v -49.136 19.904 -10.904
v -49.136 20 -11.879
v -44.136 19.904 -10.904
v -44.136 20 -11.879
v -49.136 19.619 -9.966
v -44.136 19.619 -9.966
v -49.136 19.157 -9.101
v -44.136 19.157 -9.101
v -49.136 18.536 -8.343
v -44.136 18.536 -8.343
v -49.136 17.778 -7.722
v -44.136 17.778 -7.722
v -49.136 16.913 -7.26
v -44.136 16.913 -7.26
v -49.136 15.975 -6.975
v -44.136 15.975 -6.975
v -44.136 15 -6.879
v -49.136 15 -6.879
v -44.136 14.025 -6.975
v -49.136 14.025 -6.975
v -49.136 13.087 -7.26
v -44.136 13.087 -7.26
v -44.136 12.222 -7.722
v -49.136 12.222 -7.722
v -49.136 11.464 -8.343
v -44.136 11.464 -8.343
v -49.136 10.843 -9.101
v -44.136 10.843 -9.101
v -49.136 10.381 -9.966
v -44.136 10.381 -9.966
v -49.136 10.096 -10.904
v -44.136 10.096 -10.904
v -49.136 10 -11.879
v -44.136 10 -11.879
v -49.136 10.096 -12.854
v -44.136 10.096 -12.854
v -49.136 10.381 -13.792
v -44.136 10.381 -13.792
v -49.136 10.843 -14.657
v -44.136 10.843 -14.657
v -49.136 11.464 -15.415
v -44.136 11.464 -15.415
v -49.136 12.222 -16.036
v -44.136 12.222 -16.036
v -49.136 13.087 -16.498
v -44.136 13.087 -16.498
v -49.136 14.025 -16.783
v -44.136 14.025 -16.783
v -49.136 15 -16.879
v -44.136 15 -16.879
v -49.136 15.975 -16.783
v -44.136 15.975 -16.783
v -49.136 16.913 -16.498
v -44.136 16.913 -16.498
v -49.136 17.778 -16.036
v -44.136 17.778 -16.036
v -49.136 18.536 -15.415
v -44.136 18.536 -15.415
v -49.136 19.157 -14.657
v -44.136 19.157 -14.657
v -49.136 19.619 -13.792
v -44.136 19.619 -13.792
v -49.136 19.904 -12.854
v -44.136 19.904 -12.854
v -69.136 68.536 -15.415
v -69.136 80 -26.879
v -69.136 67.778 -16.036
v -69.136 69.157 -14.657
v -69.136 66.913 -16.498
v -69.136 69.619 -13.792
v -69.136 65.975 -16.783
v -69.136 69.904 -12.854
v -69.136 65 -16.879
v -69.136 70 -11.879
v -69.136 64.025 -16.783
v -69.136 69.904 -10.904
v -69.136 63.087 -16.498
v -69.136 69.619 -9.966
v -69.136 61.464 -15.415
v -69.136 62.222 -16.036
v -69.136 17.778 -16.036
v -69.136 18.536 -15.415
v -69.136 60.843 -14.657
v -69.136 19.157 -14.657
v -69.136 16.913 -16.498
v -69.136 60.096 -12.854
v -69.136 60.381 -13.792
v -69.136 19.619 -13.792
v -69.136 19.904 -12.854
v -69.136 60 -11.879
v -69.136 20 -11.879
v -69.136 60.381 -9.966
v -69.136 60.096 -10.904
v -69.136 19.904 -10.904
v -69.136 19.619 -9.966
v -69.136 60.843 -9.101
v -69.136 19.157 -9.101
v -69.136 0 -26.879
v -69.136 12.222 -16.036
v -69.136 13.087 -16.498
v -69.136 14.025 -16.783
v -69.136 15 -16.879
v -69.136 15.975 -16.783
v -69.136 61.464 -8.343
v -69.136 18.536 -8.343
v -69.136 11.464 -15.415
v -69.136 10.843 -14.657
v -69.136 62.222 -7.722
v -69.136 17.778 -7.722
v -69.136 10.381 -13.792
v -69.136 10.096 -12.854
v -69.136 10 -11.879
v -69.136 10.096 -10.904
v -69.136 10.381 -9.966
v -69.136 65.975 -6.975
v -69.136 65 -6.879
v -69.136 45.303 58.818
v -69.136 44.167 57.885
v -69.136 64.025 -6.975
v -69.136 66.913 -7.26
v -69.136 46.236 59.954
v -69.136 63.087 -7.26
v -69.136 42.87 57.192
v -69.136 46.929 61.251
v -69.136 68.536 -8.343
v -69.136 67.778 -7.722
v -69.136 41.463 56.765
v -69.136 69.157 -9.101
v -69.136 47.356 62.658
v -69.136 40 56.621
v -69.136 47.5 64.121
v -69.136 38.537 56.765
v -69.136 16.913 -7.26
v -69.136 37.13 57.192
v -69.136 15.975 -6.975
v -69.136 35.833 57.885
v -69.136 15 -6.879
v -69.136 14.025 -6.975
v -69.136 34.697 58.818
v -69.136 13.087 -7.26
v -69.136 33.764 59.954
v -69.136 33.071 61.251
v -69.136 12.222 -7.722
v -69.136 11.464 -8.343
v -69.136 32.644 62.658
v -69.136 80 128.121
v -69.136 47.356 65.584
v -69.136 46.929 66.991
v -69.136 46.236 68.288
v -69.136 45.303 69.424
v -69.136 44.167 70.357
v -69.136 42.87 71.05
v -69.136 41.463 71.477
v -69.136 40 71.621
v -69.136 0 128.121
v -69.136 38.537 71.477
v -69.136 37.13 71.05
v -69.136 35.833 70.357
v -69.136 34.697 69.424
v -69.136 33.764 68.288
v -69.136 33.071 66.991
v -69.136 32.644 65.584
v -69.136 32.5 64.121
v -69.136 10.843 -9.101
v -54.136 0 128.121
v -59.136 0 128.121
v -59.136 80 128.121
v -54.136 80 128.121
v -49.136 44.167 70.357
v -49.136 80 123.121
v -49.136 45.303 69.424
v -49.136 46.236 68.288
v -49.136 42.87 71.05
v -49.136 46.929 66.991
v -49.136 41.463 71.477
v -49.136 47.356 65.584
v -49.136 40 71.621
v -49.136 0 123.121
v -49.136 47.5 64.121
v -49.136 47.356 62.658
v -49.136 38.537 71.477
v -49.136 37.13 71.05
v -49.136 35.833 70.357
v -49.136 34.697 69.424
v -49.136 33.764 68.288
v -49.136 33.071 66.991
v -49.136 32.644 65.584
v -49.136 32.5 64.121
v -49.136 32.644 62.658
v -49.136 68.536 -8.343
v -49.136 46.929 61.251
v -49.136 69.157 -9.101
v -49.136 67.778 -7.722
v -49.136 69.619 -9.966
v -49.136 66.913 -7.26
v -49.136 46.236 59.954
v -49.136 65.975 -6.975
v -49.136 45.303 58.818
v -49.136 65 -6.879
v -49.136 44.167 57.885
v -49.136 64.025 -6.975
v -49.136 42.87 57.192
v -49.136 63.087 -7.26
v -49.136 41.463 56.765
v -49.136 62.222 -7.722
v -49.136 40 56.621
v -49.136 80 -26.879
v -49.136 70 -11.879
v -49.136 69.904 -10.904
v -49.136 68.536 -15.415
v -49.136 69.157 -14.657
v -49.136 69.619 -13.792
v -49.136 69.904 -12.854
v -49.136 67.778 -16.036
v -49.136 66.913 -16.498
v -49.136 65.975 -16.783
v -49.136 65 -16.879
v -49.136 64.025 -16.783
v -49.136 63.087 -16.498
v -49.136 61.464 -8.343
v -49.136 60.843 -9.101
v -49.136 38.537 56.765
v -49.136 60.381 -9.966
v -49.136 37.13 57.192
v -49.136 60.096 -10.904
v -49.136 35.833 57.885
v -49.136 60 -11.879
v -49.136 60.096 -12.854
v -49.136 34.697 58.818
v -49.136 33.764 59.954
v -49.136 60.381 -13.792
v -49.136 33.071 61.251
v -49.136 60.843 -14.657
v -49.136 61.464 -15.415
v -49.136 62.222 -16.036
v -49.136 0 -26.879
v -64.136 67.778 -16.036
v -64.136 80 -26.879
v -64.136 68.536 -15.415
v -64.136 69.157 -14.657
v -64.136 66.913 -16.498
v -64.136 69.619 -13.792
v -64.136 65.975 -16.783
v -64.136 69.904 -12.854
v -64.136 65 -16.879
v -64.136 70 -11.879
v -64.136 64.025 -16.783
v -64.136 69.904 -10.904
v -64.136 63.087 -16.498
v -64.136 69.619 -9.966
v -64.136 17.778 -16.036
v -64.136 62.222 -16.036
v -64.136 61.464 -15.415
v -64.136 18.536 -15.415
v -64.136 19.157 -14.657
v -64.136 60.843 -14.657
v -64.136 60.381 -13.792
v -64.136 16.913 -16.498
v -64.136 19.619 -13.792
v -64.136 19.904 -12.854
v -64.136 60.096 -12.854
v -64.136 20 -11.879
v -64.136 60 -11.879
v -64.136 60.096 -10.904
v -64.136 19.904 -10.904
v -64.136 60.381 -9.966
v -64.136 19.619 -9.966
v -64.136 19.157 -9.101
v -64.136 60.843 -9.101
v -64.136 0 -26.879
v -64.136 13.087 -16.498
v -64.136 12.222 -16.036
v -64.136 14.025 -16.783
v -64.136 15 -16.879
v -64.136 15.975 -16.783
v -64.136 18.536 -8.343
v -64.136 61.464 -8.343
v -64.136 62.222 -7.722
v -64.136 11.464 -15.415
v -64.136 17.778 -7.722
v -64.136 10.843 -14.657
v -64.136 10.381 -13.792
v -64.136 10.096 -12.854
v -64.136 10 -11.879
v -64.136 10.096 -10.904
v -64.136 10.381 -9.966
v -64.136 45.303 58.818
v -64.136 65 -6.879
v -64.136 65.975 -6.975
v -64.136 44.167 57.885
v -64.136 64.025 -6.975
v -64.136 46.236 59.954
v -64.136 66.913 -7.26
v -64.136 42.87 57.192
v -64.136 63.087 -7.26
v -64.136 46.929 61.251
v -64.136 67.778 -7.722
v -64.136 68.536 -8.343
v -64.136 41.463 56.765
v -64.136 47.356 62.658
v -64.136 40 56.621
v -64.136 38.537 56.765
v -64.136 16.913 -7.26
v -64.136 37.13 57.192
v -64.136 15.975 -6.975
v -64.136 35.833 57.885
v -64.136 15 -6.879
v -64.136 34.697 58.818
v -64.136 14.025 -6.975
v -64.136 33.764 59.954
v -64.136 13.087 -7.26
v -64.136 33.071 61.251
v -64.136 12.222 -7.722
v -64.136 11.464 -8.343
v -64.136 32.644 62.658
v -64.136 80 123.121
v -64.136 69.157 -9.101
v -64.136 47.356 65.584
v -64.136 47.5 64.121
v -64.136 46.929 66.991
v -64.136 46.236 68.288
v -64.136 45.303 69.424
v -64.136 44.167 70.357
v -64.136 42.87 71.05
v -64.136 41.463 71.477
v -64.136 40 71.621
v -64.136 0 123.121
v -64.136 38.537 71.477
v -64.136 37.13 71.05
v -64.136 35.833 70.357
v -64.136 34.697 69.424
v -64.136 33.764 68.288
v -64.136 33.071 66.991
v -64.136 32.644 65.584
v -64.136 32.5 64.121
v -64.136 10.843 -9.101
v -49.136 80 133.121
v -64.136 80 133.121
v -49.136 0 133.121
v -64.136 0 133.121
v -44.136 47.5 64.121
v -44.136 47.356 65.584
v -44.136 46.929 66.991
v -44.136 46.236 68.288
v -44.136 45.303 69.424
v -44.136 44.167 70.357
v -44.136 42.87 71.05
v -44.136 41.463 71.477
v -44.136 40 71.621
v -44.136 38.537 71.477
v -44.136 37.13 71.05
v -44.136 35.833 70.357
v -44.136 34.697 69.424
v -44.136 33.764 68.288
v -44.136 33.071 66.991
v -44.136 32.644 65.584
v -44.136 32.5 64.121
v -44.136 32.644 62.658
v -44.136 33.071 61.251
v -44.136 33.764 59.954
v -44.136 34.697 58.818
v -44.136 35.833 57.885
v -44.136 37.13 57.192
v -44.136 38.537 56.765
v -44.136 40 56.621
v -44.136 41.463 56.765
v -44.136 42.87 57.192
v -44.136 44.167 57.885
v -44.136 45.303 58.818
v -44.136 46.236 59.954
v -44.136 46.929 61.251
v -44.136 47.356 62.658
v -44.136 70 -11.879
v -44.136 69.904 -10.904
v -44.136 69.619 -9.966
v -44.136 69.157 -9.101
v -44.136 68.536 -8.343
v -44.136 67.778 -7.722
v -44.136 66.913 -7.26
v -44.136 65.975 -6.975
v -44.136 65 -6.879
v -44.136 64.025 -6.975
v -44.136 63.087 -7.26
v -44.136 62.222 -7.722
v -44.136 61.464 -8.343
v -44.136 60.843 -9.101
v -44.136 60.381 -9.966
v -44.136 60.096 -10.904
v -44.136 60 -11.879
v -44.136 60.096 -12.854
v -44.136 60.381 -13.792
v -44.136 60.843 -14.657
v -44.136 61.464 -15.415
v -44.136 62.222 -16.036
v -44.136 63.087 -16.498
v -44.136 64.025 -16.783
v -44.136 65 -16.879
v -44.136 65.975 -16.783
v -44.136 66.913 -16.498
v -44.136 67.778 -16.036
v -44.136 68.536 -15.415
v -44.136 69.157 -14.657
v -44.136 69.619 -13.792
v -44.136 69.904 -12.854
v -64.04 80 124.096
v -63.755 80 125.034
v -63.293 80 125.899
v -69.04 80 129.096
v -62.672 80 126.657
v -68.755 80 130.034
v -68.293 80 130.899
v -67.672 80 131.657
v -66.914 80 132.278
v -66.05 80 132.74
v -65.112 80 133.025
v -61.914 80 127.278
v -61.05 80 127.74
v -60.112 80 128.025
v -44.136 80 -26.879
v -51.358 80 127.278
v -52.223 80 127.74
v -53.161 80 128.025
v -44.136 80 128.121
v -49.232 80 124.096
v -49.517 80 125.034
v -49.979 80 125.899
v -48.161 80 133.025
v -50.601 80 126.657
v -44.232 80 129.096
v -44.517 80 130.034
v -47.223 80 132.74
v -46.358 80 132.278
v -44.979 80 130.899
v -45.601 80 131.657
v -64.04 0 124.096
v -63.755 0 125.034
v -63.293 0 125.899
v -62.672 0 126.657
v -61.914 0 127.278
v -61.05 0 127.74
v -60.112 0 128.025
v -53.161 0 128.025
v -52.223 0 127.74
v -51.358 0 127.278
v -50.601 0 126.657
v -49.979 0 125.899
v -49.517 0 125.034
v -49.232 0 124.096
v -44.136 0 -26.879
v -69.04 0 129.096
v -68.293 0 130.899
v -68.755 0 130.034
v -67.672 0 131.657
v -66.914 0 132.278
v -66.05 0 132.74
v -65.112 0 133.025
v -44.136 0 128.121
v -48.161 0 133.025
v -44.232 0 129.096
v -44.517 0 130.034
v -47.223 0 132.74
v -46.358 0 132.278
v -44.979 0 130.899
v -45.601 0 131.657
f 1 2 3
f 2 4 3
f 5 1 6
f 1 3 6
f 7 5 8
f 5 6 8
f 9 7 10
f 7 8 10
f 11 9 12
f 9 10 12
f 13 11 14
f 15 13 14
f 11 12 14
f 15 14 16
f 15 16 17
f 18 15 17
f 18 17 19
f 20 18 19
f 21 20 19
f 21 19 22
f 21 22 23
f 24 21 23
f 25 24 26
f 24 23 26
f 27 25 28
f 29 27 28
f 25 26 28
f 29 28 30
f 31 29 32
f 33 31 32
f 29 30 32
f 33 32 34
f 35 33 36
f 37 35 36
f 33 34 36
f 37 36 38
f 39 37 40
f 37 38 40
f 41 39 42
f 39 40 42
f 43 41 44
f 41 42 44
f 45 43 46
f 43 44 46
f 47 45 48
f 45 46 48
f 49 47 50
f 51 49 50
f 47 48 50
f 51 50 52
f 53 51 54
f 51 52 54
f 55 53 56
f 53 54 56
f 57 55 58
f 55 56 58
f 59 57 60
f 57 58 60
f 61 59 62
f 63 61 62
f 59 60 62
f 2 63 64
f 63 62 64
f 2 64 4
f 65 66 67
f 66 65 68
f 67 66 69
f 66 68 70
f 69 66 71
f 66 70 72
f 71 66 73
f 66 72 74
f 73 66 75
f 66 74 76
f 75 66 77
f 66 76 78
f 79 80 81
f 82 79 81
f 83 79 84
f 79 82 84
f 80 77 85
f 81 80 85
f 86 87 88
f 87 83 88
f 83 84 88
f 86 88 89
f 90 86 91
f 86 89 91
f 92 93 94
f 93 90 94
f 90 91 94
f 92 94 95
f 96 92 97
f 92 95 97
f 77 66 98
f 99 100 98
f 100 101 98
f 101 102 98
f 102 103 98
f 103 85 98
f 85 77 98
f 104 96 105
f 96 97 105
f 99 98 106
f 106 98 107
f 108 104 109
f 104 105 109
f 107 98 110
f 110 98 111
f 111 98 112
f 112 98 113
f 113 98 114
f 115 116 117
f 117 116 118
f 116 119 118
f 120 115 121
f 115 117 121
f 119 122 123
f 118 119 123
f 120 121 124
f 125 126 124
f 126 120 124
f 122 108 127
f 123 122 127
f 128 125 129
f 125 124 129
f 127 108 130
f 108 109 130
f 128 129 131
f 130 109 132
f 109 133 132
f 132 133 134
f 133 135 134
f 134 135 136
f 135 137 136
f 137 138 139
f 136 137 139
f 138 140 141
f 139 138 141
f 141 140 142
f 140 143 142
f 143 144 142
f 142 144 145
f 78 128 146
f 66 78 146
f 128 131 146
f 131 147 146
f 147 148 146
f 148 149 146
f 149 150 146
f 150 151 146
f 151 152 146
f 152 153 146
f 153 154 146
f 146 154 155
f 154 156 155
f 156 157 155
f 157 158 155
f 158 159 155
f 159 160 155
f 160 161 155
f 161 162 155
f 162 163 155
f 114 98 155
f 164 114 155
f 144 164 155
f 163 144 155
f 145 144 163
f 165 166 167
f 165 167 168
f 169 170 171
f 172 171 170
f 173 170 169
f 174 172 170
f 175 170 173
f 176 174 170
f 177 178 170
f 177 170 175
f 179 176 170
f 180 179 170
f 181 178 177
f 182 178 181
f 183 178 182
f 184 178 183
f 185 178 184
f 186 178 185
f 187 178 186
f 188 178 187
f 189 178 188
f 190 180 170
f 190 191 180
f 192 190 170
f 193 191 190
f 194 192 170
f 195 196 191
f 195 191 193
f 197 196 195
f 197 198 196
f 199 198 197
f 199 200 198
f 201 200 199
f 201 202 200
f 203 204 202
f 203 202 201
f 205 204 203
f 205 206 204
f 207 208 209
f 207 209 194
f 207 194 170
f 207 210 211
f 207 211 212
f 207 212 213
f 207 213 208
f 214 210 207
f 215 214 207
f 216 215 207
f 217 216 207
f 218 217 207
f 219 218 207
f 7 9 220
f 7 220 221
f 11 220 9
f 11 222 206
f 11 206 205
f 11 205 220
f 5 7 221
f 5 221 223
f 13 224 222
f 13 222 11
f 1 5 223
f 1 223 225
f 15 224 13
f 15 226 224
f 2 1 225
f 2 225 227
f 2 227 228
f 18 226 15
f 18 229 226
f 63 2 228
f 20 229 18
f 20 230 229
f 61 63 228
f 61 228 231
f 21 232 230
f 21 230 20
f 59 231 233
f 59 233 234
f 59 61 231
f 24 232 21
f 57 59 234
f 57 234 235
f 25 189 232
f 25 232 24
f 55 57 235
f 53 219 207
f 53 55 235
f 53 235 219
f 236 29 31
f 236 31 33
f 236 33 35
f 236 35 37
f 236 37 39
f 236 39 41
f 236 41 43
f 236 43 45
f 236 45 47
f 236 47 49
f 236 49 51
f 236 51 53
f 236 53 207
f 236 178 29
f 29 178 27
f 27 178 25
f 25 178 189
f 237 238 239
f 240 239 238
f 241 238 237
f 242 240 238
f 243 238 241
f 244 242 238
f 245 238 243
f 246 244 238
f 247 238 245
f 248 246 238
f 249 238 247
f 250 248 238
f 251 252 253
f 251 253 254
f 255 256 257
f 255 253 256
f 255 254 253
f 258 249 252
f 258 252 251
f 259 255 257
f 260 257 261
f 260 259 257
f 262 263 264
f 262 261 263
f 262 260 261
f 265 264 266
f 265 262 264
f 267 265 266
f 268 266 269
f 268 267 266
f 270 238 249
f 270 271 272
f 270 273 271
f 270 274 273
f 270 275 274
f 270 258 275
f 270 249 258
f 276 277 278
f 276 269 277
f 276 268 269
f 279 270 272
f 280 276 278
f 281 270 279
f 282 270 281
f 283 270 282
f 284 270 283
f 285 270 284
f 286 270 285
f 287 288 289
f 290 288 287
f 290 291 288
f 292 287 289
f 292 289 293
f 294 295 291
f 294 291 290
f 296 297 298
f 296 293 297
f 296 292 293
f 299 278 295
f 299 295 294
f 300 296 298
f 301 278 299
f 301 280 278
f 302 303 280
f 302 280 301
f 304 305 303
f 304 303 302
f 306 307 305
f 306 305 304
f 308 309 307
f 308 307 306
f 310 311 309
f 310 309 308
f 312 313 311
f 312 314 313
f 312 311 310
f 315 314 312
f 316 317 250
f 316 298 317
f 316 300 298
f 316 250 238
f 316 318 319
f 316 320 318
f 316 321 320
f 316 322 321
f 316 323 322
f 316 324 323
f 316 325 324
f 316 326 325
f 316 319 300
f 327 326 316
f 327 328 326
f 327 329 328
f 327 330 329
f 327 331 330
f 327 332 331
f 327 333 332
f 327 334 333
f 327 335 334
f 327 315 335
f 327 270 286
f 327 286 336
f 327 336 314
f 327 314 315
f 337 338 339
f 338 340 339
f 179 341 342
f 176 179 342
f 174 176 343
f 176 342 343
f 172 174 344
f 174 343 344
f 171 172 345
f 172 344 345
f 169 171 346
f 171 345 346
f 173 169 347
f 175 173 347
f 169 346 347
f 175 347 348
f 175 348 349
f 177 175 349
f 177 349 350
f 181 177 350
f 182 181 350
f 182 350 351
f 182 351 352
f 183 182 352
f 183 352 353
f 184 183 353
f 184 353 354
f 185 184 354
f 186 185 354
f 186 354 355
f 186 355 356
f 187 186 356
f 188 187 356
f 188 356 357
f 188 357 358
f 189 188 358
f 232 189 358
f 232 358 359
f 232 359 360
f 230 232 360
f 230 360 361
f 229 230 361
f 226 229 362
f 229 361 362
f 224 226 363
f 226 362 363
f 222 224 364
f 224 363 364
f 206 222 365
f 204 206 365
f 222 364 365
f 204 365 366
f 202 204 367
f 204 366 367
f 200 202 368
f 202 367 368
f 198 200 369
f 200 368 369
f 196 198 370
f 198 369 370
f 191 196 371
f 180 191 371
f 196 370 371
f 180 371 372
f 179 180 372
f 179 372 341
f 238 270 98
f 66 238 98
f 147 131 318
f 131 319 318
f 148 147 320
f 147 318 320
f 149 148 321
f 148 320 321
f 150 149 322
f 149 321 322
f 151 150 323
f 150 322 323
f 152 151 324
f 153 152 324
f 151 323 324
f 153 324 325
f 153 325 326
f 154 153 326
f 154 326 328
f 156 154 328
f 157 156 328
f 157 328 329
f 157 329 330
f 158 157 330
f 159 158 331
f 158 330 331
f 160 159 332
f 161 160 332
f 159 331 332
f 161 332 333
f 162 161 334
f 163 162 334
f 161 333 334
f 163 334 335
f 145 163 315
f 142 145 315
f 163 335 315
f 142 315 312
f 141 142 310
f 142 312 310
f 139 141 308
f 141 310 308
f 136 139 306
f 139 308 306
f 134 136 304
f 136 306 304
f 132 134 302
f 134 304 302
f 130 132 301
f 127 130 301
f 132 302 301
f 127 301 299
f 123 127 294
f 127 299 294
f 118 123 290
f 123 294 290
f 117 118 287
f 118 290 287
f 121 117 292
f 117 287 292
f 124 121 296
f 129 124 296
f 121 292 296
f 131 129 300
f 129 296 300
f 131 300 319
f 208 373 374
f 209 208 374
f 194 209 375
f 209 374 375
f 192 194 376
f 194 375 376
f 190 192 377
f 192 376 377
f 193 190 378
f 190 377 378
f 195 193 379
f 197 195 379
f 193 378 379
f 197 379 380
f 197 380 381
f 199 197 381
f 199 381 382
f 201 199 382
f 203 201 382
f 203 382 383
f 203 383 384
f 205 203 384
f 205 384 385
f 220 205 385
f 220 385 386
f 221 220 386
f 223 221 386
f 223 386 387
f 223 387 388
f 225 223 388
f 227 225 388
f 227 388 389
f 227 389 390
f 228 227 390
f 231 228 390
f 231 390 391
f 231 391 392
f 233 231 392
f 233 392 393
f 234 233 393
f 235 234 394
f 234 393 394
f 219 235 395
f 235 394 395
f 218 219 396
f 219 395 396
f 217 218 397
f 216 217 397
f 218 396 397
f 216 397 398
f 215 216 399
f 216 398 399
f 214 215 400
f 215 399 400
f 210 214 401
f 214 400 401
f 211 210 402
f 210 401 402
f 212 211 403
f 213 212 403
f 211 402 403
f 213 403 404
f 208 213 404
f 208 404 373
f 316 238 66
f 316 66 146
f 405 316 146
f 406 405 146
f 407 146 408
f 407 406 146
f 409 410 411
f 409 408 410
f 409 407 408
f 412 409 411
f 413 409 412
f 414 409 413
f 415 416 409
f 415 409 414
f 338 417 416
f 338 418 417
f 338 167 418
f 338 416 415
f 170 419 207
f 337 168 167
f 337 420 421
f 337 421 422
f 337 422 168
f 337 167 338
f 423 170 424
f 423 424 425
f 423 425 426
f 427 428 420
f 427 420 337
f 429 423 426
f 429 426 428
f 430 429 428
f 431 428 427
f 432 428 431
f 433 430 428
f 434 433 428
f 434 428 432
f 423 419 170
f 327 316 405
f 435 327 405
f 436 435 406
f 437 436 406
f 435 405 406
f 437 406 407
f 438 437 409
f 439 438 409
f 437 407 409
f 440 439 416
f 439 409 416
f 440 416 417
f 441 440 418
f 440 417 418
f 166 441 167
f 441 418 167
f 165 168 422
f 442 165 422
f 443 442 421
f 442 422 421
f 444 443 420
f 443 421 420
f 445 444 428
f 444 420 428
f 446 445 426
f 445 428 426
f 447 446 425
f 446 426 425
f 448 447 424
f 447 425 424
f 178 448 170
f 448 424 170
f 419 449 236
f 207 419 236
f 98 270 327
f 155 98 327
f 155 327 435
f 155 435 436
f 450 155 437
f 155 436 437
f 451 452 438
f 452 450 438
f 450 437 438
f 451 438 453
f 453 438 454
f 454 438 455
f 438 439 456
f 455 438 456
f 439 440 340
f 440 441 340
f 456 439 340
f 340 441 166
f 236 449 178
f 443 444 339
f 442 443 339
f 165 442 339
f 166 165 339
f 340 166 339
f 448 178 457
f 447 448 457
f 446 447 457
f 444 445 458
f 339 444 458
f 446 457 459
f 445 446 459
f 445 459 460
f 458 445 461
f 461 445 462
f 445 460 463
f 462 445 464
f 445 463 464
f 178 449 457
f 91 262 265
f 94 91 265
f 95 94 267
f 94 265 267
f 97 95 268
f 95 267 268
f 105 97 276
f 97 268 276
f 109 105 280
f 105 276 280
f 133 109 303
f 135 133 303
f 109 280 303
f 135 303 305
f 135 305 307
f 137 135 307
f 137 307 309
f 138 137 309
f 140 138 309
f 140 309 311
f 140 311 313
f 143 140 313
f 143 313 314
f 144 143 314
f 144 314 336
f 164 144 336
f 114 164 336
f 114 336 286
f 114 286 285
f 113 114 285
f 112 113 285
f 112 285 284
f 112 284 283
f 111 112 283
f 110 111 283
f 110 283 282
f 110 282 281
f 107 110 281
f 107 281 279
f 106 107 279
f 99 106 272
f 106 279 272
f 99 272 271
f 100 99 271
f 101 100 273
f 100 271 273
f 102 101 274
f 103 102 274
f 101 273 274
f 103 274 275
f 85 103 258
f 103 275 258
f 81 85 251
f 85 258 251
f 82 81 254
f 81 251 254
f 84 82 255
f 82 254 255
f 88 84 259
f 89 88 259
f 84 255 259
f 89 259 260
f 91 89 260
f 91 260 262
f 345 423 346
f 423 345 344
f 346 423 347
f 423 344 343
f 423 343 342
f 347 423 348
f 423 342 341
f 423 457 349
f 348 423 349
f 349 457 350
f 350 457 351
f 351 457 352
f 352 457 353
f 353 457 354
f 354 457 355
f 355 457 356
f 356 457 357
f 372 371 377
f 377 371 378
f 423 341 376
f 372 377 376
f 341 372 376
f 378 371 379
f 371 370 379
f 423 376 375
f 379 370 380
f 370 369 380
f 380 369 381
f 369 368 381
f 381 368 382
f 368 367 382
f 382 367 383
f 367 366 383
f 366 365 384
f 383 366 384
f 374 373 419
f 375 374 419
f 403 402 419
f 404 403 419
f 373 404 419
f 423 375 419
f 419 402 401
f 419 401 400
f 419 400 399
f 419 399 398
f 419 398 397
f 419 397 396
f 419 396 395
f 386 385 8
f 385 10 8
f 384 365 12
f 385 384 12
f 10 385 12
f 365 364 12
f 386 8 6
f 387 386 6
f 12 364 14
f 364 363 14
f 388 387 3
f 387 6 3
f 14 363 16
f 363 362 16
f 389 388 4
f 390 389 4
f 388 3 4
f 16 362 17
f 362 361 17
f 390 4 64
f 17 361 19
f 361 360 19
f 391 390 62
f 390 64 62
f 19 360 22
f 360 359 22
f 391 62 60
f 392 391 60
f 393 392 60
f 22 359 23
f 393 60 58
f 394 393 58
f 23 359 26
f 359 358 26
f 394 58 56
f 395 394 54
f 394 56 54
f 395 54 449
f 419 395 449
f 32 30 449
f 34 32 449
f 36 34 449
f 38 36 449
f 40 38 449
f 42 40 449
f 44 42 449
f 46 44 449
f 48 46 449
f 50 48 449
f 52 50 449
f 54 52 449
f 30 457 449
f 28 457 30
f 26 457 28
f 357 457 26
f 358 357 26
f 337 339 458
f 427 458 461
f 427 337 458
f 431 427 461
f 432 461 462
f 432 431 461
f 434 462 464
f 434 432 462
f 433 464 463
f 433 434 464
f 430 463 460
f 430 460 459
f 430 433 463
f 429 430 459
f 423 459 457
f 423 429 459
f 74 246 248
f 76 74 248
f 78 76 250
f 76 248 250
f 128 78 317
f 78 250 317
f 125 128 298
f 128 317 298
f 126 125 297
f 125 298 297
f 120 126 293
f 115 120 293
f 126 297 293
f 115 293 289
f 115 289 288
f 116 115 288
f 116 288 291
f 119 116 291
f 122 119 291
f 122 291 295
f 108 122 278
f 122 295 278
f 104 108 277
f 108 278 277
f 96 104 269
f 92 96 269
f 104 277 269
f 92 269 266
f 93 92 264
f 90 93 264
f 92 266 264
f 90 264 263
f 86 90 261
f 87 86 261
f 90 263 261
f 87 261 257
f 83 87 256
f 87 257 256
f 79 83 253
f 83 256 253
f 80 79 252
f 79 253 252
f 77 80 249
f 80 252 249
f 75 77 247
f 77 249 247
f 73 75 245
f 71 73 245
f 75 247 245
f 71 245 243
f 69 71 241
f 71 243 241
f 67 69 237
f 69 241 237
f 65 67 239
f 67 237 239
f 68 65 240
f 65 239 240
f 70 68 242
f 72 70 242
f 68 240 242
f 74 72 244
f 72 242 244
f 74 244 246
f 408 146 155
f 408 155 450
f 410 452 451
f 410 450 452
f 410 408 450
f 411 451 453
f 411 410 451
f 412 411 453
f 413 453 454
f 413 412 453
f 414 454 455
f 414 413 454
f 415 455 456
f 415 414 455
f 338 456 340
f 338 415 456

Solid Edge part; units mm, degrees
sketch "Sketch1" plane through (0, 0, 0) normal (0, -1, 0) x (1, 0, 0)
  line L0 (-69.1361, 133.121) -> (-44.1361, 133.121)
  line L1 (-44.1361, 133.121) -> (-44.1361, -26.879)
  line L2 (-44.1361, -26.879) -> (-49.1361, -26.879)
  line L3 (-49.1361, 128.121) -> (-49.1361, -26.879)
  line L4 (-64.1361, 128.121) -> (-49.1361, 128.121)
  line L5 (-64.1361, -26.879) -> (-64.1361, 128.121)
  line L6 (-64.1361, -26.879) -> (-69.1361, -26.879)
  line L7 (-69.1361, -26.879) -> (-69.1361, 133.121)
extrude "Protrusion1" add sketch "Sketch1" against normal blind 80
fillet "Round_1" radius 5 2 edges at (-69.1361, 40, 133.121) (-44.1361, 40, 133.121)
fillet "Round_2" radius 5 2 edges at (-64.1361, 40, 128.121) (-49.1361, 40, 128.121)
sketch "Sketch2" plane through (-44.1361, 40, 18.121) normal (1, 0, 0) x (0, 1, 0)
  circle A0 centre (-25, -30) radius 5
  circle A1 centre (25, -30) radius 5
  circle A2 centre (0, 46) radius 7.5
  dimension "D1" = 15
  dimension "D2" = 10
  dimension "D3" = 15
  dimension "D4" = 25
  dimension "D5" = 25
  dimension "D6" = 64
extrude "Cutout1" cut sketch "Sketch2" against normal through all
